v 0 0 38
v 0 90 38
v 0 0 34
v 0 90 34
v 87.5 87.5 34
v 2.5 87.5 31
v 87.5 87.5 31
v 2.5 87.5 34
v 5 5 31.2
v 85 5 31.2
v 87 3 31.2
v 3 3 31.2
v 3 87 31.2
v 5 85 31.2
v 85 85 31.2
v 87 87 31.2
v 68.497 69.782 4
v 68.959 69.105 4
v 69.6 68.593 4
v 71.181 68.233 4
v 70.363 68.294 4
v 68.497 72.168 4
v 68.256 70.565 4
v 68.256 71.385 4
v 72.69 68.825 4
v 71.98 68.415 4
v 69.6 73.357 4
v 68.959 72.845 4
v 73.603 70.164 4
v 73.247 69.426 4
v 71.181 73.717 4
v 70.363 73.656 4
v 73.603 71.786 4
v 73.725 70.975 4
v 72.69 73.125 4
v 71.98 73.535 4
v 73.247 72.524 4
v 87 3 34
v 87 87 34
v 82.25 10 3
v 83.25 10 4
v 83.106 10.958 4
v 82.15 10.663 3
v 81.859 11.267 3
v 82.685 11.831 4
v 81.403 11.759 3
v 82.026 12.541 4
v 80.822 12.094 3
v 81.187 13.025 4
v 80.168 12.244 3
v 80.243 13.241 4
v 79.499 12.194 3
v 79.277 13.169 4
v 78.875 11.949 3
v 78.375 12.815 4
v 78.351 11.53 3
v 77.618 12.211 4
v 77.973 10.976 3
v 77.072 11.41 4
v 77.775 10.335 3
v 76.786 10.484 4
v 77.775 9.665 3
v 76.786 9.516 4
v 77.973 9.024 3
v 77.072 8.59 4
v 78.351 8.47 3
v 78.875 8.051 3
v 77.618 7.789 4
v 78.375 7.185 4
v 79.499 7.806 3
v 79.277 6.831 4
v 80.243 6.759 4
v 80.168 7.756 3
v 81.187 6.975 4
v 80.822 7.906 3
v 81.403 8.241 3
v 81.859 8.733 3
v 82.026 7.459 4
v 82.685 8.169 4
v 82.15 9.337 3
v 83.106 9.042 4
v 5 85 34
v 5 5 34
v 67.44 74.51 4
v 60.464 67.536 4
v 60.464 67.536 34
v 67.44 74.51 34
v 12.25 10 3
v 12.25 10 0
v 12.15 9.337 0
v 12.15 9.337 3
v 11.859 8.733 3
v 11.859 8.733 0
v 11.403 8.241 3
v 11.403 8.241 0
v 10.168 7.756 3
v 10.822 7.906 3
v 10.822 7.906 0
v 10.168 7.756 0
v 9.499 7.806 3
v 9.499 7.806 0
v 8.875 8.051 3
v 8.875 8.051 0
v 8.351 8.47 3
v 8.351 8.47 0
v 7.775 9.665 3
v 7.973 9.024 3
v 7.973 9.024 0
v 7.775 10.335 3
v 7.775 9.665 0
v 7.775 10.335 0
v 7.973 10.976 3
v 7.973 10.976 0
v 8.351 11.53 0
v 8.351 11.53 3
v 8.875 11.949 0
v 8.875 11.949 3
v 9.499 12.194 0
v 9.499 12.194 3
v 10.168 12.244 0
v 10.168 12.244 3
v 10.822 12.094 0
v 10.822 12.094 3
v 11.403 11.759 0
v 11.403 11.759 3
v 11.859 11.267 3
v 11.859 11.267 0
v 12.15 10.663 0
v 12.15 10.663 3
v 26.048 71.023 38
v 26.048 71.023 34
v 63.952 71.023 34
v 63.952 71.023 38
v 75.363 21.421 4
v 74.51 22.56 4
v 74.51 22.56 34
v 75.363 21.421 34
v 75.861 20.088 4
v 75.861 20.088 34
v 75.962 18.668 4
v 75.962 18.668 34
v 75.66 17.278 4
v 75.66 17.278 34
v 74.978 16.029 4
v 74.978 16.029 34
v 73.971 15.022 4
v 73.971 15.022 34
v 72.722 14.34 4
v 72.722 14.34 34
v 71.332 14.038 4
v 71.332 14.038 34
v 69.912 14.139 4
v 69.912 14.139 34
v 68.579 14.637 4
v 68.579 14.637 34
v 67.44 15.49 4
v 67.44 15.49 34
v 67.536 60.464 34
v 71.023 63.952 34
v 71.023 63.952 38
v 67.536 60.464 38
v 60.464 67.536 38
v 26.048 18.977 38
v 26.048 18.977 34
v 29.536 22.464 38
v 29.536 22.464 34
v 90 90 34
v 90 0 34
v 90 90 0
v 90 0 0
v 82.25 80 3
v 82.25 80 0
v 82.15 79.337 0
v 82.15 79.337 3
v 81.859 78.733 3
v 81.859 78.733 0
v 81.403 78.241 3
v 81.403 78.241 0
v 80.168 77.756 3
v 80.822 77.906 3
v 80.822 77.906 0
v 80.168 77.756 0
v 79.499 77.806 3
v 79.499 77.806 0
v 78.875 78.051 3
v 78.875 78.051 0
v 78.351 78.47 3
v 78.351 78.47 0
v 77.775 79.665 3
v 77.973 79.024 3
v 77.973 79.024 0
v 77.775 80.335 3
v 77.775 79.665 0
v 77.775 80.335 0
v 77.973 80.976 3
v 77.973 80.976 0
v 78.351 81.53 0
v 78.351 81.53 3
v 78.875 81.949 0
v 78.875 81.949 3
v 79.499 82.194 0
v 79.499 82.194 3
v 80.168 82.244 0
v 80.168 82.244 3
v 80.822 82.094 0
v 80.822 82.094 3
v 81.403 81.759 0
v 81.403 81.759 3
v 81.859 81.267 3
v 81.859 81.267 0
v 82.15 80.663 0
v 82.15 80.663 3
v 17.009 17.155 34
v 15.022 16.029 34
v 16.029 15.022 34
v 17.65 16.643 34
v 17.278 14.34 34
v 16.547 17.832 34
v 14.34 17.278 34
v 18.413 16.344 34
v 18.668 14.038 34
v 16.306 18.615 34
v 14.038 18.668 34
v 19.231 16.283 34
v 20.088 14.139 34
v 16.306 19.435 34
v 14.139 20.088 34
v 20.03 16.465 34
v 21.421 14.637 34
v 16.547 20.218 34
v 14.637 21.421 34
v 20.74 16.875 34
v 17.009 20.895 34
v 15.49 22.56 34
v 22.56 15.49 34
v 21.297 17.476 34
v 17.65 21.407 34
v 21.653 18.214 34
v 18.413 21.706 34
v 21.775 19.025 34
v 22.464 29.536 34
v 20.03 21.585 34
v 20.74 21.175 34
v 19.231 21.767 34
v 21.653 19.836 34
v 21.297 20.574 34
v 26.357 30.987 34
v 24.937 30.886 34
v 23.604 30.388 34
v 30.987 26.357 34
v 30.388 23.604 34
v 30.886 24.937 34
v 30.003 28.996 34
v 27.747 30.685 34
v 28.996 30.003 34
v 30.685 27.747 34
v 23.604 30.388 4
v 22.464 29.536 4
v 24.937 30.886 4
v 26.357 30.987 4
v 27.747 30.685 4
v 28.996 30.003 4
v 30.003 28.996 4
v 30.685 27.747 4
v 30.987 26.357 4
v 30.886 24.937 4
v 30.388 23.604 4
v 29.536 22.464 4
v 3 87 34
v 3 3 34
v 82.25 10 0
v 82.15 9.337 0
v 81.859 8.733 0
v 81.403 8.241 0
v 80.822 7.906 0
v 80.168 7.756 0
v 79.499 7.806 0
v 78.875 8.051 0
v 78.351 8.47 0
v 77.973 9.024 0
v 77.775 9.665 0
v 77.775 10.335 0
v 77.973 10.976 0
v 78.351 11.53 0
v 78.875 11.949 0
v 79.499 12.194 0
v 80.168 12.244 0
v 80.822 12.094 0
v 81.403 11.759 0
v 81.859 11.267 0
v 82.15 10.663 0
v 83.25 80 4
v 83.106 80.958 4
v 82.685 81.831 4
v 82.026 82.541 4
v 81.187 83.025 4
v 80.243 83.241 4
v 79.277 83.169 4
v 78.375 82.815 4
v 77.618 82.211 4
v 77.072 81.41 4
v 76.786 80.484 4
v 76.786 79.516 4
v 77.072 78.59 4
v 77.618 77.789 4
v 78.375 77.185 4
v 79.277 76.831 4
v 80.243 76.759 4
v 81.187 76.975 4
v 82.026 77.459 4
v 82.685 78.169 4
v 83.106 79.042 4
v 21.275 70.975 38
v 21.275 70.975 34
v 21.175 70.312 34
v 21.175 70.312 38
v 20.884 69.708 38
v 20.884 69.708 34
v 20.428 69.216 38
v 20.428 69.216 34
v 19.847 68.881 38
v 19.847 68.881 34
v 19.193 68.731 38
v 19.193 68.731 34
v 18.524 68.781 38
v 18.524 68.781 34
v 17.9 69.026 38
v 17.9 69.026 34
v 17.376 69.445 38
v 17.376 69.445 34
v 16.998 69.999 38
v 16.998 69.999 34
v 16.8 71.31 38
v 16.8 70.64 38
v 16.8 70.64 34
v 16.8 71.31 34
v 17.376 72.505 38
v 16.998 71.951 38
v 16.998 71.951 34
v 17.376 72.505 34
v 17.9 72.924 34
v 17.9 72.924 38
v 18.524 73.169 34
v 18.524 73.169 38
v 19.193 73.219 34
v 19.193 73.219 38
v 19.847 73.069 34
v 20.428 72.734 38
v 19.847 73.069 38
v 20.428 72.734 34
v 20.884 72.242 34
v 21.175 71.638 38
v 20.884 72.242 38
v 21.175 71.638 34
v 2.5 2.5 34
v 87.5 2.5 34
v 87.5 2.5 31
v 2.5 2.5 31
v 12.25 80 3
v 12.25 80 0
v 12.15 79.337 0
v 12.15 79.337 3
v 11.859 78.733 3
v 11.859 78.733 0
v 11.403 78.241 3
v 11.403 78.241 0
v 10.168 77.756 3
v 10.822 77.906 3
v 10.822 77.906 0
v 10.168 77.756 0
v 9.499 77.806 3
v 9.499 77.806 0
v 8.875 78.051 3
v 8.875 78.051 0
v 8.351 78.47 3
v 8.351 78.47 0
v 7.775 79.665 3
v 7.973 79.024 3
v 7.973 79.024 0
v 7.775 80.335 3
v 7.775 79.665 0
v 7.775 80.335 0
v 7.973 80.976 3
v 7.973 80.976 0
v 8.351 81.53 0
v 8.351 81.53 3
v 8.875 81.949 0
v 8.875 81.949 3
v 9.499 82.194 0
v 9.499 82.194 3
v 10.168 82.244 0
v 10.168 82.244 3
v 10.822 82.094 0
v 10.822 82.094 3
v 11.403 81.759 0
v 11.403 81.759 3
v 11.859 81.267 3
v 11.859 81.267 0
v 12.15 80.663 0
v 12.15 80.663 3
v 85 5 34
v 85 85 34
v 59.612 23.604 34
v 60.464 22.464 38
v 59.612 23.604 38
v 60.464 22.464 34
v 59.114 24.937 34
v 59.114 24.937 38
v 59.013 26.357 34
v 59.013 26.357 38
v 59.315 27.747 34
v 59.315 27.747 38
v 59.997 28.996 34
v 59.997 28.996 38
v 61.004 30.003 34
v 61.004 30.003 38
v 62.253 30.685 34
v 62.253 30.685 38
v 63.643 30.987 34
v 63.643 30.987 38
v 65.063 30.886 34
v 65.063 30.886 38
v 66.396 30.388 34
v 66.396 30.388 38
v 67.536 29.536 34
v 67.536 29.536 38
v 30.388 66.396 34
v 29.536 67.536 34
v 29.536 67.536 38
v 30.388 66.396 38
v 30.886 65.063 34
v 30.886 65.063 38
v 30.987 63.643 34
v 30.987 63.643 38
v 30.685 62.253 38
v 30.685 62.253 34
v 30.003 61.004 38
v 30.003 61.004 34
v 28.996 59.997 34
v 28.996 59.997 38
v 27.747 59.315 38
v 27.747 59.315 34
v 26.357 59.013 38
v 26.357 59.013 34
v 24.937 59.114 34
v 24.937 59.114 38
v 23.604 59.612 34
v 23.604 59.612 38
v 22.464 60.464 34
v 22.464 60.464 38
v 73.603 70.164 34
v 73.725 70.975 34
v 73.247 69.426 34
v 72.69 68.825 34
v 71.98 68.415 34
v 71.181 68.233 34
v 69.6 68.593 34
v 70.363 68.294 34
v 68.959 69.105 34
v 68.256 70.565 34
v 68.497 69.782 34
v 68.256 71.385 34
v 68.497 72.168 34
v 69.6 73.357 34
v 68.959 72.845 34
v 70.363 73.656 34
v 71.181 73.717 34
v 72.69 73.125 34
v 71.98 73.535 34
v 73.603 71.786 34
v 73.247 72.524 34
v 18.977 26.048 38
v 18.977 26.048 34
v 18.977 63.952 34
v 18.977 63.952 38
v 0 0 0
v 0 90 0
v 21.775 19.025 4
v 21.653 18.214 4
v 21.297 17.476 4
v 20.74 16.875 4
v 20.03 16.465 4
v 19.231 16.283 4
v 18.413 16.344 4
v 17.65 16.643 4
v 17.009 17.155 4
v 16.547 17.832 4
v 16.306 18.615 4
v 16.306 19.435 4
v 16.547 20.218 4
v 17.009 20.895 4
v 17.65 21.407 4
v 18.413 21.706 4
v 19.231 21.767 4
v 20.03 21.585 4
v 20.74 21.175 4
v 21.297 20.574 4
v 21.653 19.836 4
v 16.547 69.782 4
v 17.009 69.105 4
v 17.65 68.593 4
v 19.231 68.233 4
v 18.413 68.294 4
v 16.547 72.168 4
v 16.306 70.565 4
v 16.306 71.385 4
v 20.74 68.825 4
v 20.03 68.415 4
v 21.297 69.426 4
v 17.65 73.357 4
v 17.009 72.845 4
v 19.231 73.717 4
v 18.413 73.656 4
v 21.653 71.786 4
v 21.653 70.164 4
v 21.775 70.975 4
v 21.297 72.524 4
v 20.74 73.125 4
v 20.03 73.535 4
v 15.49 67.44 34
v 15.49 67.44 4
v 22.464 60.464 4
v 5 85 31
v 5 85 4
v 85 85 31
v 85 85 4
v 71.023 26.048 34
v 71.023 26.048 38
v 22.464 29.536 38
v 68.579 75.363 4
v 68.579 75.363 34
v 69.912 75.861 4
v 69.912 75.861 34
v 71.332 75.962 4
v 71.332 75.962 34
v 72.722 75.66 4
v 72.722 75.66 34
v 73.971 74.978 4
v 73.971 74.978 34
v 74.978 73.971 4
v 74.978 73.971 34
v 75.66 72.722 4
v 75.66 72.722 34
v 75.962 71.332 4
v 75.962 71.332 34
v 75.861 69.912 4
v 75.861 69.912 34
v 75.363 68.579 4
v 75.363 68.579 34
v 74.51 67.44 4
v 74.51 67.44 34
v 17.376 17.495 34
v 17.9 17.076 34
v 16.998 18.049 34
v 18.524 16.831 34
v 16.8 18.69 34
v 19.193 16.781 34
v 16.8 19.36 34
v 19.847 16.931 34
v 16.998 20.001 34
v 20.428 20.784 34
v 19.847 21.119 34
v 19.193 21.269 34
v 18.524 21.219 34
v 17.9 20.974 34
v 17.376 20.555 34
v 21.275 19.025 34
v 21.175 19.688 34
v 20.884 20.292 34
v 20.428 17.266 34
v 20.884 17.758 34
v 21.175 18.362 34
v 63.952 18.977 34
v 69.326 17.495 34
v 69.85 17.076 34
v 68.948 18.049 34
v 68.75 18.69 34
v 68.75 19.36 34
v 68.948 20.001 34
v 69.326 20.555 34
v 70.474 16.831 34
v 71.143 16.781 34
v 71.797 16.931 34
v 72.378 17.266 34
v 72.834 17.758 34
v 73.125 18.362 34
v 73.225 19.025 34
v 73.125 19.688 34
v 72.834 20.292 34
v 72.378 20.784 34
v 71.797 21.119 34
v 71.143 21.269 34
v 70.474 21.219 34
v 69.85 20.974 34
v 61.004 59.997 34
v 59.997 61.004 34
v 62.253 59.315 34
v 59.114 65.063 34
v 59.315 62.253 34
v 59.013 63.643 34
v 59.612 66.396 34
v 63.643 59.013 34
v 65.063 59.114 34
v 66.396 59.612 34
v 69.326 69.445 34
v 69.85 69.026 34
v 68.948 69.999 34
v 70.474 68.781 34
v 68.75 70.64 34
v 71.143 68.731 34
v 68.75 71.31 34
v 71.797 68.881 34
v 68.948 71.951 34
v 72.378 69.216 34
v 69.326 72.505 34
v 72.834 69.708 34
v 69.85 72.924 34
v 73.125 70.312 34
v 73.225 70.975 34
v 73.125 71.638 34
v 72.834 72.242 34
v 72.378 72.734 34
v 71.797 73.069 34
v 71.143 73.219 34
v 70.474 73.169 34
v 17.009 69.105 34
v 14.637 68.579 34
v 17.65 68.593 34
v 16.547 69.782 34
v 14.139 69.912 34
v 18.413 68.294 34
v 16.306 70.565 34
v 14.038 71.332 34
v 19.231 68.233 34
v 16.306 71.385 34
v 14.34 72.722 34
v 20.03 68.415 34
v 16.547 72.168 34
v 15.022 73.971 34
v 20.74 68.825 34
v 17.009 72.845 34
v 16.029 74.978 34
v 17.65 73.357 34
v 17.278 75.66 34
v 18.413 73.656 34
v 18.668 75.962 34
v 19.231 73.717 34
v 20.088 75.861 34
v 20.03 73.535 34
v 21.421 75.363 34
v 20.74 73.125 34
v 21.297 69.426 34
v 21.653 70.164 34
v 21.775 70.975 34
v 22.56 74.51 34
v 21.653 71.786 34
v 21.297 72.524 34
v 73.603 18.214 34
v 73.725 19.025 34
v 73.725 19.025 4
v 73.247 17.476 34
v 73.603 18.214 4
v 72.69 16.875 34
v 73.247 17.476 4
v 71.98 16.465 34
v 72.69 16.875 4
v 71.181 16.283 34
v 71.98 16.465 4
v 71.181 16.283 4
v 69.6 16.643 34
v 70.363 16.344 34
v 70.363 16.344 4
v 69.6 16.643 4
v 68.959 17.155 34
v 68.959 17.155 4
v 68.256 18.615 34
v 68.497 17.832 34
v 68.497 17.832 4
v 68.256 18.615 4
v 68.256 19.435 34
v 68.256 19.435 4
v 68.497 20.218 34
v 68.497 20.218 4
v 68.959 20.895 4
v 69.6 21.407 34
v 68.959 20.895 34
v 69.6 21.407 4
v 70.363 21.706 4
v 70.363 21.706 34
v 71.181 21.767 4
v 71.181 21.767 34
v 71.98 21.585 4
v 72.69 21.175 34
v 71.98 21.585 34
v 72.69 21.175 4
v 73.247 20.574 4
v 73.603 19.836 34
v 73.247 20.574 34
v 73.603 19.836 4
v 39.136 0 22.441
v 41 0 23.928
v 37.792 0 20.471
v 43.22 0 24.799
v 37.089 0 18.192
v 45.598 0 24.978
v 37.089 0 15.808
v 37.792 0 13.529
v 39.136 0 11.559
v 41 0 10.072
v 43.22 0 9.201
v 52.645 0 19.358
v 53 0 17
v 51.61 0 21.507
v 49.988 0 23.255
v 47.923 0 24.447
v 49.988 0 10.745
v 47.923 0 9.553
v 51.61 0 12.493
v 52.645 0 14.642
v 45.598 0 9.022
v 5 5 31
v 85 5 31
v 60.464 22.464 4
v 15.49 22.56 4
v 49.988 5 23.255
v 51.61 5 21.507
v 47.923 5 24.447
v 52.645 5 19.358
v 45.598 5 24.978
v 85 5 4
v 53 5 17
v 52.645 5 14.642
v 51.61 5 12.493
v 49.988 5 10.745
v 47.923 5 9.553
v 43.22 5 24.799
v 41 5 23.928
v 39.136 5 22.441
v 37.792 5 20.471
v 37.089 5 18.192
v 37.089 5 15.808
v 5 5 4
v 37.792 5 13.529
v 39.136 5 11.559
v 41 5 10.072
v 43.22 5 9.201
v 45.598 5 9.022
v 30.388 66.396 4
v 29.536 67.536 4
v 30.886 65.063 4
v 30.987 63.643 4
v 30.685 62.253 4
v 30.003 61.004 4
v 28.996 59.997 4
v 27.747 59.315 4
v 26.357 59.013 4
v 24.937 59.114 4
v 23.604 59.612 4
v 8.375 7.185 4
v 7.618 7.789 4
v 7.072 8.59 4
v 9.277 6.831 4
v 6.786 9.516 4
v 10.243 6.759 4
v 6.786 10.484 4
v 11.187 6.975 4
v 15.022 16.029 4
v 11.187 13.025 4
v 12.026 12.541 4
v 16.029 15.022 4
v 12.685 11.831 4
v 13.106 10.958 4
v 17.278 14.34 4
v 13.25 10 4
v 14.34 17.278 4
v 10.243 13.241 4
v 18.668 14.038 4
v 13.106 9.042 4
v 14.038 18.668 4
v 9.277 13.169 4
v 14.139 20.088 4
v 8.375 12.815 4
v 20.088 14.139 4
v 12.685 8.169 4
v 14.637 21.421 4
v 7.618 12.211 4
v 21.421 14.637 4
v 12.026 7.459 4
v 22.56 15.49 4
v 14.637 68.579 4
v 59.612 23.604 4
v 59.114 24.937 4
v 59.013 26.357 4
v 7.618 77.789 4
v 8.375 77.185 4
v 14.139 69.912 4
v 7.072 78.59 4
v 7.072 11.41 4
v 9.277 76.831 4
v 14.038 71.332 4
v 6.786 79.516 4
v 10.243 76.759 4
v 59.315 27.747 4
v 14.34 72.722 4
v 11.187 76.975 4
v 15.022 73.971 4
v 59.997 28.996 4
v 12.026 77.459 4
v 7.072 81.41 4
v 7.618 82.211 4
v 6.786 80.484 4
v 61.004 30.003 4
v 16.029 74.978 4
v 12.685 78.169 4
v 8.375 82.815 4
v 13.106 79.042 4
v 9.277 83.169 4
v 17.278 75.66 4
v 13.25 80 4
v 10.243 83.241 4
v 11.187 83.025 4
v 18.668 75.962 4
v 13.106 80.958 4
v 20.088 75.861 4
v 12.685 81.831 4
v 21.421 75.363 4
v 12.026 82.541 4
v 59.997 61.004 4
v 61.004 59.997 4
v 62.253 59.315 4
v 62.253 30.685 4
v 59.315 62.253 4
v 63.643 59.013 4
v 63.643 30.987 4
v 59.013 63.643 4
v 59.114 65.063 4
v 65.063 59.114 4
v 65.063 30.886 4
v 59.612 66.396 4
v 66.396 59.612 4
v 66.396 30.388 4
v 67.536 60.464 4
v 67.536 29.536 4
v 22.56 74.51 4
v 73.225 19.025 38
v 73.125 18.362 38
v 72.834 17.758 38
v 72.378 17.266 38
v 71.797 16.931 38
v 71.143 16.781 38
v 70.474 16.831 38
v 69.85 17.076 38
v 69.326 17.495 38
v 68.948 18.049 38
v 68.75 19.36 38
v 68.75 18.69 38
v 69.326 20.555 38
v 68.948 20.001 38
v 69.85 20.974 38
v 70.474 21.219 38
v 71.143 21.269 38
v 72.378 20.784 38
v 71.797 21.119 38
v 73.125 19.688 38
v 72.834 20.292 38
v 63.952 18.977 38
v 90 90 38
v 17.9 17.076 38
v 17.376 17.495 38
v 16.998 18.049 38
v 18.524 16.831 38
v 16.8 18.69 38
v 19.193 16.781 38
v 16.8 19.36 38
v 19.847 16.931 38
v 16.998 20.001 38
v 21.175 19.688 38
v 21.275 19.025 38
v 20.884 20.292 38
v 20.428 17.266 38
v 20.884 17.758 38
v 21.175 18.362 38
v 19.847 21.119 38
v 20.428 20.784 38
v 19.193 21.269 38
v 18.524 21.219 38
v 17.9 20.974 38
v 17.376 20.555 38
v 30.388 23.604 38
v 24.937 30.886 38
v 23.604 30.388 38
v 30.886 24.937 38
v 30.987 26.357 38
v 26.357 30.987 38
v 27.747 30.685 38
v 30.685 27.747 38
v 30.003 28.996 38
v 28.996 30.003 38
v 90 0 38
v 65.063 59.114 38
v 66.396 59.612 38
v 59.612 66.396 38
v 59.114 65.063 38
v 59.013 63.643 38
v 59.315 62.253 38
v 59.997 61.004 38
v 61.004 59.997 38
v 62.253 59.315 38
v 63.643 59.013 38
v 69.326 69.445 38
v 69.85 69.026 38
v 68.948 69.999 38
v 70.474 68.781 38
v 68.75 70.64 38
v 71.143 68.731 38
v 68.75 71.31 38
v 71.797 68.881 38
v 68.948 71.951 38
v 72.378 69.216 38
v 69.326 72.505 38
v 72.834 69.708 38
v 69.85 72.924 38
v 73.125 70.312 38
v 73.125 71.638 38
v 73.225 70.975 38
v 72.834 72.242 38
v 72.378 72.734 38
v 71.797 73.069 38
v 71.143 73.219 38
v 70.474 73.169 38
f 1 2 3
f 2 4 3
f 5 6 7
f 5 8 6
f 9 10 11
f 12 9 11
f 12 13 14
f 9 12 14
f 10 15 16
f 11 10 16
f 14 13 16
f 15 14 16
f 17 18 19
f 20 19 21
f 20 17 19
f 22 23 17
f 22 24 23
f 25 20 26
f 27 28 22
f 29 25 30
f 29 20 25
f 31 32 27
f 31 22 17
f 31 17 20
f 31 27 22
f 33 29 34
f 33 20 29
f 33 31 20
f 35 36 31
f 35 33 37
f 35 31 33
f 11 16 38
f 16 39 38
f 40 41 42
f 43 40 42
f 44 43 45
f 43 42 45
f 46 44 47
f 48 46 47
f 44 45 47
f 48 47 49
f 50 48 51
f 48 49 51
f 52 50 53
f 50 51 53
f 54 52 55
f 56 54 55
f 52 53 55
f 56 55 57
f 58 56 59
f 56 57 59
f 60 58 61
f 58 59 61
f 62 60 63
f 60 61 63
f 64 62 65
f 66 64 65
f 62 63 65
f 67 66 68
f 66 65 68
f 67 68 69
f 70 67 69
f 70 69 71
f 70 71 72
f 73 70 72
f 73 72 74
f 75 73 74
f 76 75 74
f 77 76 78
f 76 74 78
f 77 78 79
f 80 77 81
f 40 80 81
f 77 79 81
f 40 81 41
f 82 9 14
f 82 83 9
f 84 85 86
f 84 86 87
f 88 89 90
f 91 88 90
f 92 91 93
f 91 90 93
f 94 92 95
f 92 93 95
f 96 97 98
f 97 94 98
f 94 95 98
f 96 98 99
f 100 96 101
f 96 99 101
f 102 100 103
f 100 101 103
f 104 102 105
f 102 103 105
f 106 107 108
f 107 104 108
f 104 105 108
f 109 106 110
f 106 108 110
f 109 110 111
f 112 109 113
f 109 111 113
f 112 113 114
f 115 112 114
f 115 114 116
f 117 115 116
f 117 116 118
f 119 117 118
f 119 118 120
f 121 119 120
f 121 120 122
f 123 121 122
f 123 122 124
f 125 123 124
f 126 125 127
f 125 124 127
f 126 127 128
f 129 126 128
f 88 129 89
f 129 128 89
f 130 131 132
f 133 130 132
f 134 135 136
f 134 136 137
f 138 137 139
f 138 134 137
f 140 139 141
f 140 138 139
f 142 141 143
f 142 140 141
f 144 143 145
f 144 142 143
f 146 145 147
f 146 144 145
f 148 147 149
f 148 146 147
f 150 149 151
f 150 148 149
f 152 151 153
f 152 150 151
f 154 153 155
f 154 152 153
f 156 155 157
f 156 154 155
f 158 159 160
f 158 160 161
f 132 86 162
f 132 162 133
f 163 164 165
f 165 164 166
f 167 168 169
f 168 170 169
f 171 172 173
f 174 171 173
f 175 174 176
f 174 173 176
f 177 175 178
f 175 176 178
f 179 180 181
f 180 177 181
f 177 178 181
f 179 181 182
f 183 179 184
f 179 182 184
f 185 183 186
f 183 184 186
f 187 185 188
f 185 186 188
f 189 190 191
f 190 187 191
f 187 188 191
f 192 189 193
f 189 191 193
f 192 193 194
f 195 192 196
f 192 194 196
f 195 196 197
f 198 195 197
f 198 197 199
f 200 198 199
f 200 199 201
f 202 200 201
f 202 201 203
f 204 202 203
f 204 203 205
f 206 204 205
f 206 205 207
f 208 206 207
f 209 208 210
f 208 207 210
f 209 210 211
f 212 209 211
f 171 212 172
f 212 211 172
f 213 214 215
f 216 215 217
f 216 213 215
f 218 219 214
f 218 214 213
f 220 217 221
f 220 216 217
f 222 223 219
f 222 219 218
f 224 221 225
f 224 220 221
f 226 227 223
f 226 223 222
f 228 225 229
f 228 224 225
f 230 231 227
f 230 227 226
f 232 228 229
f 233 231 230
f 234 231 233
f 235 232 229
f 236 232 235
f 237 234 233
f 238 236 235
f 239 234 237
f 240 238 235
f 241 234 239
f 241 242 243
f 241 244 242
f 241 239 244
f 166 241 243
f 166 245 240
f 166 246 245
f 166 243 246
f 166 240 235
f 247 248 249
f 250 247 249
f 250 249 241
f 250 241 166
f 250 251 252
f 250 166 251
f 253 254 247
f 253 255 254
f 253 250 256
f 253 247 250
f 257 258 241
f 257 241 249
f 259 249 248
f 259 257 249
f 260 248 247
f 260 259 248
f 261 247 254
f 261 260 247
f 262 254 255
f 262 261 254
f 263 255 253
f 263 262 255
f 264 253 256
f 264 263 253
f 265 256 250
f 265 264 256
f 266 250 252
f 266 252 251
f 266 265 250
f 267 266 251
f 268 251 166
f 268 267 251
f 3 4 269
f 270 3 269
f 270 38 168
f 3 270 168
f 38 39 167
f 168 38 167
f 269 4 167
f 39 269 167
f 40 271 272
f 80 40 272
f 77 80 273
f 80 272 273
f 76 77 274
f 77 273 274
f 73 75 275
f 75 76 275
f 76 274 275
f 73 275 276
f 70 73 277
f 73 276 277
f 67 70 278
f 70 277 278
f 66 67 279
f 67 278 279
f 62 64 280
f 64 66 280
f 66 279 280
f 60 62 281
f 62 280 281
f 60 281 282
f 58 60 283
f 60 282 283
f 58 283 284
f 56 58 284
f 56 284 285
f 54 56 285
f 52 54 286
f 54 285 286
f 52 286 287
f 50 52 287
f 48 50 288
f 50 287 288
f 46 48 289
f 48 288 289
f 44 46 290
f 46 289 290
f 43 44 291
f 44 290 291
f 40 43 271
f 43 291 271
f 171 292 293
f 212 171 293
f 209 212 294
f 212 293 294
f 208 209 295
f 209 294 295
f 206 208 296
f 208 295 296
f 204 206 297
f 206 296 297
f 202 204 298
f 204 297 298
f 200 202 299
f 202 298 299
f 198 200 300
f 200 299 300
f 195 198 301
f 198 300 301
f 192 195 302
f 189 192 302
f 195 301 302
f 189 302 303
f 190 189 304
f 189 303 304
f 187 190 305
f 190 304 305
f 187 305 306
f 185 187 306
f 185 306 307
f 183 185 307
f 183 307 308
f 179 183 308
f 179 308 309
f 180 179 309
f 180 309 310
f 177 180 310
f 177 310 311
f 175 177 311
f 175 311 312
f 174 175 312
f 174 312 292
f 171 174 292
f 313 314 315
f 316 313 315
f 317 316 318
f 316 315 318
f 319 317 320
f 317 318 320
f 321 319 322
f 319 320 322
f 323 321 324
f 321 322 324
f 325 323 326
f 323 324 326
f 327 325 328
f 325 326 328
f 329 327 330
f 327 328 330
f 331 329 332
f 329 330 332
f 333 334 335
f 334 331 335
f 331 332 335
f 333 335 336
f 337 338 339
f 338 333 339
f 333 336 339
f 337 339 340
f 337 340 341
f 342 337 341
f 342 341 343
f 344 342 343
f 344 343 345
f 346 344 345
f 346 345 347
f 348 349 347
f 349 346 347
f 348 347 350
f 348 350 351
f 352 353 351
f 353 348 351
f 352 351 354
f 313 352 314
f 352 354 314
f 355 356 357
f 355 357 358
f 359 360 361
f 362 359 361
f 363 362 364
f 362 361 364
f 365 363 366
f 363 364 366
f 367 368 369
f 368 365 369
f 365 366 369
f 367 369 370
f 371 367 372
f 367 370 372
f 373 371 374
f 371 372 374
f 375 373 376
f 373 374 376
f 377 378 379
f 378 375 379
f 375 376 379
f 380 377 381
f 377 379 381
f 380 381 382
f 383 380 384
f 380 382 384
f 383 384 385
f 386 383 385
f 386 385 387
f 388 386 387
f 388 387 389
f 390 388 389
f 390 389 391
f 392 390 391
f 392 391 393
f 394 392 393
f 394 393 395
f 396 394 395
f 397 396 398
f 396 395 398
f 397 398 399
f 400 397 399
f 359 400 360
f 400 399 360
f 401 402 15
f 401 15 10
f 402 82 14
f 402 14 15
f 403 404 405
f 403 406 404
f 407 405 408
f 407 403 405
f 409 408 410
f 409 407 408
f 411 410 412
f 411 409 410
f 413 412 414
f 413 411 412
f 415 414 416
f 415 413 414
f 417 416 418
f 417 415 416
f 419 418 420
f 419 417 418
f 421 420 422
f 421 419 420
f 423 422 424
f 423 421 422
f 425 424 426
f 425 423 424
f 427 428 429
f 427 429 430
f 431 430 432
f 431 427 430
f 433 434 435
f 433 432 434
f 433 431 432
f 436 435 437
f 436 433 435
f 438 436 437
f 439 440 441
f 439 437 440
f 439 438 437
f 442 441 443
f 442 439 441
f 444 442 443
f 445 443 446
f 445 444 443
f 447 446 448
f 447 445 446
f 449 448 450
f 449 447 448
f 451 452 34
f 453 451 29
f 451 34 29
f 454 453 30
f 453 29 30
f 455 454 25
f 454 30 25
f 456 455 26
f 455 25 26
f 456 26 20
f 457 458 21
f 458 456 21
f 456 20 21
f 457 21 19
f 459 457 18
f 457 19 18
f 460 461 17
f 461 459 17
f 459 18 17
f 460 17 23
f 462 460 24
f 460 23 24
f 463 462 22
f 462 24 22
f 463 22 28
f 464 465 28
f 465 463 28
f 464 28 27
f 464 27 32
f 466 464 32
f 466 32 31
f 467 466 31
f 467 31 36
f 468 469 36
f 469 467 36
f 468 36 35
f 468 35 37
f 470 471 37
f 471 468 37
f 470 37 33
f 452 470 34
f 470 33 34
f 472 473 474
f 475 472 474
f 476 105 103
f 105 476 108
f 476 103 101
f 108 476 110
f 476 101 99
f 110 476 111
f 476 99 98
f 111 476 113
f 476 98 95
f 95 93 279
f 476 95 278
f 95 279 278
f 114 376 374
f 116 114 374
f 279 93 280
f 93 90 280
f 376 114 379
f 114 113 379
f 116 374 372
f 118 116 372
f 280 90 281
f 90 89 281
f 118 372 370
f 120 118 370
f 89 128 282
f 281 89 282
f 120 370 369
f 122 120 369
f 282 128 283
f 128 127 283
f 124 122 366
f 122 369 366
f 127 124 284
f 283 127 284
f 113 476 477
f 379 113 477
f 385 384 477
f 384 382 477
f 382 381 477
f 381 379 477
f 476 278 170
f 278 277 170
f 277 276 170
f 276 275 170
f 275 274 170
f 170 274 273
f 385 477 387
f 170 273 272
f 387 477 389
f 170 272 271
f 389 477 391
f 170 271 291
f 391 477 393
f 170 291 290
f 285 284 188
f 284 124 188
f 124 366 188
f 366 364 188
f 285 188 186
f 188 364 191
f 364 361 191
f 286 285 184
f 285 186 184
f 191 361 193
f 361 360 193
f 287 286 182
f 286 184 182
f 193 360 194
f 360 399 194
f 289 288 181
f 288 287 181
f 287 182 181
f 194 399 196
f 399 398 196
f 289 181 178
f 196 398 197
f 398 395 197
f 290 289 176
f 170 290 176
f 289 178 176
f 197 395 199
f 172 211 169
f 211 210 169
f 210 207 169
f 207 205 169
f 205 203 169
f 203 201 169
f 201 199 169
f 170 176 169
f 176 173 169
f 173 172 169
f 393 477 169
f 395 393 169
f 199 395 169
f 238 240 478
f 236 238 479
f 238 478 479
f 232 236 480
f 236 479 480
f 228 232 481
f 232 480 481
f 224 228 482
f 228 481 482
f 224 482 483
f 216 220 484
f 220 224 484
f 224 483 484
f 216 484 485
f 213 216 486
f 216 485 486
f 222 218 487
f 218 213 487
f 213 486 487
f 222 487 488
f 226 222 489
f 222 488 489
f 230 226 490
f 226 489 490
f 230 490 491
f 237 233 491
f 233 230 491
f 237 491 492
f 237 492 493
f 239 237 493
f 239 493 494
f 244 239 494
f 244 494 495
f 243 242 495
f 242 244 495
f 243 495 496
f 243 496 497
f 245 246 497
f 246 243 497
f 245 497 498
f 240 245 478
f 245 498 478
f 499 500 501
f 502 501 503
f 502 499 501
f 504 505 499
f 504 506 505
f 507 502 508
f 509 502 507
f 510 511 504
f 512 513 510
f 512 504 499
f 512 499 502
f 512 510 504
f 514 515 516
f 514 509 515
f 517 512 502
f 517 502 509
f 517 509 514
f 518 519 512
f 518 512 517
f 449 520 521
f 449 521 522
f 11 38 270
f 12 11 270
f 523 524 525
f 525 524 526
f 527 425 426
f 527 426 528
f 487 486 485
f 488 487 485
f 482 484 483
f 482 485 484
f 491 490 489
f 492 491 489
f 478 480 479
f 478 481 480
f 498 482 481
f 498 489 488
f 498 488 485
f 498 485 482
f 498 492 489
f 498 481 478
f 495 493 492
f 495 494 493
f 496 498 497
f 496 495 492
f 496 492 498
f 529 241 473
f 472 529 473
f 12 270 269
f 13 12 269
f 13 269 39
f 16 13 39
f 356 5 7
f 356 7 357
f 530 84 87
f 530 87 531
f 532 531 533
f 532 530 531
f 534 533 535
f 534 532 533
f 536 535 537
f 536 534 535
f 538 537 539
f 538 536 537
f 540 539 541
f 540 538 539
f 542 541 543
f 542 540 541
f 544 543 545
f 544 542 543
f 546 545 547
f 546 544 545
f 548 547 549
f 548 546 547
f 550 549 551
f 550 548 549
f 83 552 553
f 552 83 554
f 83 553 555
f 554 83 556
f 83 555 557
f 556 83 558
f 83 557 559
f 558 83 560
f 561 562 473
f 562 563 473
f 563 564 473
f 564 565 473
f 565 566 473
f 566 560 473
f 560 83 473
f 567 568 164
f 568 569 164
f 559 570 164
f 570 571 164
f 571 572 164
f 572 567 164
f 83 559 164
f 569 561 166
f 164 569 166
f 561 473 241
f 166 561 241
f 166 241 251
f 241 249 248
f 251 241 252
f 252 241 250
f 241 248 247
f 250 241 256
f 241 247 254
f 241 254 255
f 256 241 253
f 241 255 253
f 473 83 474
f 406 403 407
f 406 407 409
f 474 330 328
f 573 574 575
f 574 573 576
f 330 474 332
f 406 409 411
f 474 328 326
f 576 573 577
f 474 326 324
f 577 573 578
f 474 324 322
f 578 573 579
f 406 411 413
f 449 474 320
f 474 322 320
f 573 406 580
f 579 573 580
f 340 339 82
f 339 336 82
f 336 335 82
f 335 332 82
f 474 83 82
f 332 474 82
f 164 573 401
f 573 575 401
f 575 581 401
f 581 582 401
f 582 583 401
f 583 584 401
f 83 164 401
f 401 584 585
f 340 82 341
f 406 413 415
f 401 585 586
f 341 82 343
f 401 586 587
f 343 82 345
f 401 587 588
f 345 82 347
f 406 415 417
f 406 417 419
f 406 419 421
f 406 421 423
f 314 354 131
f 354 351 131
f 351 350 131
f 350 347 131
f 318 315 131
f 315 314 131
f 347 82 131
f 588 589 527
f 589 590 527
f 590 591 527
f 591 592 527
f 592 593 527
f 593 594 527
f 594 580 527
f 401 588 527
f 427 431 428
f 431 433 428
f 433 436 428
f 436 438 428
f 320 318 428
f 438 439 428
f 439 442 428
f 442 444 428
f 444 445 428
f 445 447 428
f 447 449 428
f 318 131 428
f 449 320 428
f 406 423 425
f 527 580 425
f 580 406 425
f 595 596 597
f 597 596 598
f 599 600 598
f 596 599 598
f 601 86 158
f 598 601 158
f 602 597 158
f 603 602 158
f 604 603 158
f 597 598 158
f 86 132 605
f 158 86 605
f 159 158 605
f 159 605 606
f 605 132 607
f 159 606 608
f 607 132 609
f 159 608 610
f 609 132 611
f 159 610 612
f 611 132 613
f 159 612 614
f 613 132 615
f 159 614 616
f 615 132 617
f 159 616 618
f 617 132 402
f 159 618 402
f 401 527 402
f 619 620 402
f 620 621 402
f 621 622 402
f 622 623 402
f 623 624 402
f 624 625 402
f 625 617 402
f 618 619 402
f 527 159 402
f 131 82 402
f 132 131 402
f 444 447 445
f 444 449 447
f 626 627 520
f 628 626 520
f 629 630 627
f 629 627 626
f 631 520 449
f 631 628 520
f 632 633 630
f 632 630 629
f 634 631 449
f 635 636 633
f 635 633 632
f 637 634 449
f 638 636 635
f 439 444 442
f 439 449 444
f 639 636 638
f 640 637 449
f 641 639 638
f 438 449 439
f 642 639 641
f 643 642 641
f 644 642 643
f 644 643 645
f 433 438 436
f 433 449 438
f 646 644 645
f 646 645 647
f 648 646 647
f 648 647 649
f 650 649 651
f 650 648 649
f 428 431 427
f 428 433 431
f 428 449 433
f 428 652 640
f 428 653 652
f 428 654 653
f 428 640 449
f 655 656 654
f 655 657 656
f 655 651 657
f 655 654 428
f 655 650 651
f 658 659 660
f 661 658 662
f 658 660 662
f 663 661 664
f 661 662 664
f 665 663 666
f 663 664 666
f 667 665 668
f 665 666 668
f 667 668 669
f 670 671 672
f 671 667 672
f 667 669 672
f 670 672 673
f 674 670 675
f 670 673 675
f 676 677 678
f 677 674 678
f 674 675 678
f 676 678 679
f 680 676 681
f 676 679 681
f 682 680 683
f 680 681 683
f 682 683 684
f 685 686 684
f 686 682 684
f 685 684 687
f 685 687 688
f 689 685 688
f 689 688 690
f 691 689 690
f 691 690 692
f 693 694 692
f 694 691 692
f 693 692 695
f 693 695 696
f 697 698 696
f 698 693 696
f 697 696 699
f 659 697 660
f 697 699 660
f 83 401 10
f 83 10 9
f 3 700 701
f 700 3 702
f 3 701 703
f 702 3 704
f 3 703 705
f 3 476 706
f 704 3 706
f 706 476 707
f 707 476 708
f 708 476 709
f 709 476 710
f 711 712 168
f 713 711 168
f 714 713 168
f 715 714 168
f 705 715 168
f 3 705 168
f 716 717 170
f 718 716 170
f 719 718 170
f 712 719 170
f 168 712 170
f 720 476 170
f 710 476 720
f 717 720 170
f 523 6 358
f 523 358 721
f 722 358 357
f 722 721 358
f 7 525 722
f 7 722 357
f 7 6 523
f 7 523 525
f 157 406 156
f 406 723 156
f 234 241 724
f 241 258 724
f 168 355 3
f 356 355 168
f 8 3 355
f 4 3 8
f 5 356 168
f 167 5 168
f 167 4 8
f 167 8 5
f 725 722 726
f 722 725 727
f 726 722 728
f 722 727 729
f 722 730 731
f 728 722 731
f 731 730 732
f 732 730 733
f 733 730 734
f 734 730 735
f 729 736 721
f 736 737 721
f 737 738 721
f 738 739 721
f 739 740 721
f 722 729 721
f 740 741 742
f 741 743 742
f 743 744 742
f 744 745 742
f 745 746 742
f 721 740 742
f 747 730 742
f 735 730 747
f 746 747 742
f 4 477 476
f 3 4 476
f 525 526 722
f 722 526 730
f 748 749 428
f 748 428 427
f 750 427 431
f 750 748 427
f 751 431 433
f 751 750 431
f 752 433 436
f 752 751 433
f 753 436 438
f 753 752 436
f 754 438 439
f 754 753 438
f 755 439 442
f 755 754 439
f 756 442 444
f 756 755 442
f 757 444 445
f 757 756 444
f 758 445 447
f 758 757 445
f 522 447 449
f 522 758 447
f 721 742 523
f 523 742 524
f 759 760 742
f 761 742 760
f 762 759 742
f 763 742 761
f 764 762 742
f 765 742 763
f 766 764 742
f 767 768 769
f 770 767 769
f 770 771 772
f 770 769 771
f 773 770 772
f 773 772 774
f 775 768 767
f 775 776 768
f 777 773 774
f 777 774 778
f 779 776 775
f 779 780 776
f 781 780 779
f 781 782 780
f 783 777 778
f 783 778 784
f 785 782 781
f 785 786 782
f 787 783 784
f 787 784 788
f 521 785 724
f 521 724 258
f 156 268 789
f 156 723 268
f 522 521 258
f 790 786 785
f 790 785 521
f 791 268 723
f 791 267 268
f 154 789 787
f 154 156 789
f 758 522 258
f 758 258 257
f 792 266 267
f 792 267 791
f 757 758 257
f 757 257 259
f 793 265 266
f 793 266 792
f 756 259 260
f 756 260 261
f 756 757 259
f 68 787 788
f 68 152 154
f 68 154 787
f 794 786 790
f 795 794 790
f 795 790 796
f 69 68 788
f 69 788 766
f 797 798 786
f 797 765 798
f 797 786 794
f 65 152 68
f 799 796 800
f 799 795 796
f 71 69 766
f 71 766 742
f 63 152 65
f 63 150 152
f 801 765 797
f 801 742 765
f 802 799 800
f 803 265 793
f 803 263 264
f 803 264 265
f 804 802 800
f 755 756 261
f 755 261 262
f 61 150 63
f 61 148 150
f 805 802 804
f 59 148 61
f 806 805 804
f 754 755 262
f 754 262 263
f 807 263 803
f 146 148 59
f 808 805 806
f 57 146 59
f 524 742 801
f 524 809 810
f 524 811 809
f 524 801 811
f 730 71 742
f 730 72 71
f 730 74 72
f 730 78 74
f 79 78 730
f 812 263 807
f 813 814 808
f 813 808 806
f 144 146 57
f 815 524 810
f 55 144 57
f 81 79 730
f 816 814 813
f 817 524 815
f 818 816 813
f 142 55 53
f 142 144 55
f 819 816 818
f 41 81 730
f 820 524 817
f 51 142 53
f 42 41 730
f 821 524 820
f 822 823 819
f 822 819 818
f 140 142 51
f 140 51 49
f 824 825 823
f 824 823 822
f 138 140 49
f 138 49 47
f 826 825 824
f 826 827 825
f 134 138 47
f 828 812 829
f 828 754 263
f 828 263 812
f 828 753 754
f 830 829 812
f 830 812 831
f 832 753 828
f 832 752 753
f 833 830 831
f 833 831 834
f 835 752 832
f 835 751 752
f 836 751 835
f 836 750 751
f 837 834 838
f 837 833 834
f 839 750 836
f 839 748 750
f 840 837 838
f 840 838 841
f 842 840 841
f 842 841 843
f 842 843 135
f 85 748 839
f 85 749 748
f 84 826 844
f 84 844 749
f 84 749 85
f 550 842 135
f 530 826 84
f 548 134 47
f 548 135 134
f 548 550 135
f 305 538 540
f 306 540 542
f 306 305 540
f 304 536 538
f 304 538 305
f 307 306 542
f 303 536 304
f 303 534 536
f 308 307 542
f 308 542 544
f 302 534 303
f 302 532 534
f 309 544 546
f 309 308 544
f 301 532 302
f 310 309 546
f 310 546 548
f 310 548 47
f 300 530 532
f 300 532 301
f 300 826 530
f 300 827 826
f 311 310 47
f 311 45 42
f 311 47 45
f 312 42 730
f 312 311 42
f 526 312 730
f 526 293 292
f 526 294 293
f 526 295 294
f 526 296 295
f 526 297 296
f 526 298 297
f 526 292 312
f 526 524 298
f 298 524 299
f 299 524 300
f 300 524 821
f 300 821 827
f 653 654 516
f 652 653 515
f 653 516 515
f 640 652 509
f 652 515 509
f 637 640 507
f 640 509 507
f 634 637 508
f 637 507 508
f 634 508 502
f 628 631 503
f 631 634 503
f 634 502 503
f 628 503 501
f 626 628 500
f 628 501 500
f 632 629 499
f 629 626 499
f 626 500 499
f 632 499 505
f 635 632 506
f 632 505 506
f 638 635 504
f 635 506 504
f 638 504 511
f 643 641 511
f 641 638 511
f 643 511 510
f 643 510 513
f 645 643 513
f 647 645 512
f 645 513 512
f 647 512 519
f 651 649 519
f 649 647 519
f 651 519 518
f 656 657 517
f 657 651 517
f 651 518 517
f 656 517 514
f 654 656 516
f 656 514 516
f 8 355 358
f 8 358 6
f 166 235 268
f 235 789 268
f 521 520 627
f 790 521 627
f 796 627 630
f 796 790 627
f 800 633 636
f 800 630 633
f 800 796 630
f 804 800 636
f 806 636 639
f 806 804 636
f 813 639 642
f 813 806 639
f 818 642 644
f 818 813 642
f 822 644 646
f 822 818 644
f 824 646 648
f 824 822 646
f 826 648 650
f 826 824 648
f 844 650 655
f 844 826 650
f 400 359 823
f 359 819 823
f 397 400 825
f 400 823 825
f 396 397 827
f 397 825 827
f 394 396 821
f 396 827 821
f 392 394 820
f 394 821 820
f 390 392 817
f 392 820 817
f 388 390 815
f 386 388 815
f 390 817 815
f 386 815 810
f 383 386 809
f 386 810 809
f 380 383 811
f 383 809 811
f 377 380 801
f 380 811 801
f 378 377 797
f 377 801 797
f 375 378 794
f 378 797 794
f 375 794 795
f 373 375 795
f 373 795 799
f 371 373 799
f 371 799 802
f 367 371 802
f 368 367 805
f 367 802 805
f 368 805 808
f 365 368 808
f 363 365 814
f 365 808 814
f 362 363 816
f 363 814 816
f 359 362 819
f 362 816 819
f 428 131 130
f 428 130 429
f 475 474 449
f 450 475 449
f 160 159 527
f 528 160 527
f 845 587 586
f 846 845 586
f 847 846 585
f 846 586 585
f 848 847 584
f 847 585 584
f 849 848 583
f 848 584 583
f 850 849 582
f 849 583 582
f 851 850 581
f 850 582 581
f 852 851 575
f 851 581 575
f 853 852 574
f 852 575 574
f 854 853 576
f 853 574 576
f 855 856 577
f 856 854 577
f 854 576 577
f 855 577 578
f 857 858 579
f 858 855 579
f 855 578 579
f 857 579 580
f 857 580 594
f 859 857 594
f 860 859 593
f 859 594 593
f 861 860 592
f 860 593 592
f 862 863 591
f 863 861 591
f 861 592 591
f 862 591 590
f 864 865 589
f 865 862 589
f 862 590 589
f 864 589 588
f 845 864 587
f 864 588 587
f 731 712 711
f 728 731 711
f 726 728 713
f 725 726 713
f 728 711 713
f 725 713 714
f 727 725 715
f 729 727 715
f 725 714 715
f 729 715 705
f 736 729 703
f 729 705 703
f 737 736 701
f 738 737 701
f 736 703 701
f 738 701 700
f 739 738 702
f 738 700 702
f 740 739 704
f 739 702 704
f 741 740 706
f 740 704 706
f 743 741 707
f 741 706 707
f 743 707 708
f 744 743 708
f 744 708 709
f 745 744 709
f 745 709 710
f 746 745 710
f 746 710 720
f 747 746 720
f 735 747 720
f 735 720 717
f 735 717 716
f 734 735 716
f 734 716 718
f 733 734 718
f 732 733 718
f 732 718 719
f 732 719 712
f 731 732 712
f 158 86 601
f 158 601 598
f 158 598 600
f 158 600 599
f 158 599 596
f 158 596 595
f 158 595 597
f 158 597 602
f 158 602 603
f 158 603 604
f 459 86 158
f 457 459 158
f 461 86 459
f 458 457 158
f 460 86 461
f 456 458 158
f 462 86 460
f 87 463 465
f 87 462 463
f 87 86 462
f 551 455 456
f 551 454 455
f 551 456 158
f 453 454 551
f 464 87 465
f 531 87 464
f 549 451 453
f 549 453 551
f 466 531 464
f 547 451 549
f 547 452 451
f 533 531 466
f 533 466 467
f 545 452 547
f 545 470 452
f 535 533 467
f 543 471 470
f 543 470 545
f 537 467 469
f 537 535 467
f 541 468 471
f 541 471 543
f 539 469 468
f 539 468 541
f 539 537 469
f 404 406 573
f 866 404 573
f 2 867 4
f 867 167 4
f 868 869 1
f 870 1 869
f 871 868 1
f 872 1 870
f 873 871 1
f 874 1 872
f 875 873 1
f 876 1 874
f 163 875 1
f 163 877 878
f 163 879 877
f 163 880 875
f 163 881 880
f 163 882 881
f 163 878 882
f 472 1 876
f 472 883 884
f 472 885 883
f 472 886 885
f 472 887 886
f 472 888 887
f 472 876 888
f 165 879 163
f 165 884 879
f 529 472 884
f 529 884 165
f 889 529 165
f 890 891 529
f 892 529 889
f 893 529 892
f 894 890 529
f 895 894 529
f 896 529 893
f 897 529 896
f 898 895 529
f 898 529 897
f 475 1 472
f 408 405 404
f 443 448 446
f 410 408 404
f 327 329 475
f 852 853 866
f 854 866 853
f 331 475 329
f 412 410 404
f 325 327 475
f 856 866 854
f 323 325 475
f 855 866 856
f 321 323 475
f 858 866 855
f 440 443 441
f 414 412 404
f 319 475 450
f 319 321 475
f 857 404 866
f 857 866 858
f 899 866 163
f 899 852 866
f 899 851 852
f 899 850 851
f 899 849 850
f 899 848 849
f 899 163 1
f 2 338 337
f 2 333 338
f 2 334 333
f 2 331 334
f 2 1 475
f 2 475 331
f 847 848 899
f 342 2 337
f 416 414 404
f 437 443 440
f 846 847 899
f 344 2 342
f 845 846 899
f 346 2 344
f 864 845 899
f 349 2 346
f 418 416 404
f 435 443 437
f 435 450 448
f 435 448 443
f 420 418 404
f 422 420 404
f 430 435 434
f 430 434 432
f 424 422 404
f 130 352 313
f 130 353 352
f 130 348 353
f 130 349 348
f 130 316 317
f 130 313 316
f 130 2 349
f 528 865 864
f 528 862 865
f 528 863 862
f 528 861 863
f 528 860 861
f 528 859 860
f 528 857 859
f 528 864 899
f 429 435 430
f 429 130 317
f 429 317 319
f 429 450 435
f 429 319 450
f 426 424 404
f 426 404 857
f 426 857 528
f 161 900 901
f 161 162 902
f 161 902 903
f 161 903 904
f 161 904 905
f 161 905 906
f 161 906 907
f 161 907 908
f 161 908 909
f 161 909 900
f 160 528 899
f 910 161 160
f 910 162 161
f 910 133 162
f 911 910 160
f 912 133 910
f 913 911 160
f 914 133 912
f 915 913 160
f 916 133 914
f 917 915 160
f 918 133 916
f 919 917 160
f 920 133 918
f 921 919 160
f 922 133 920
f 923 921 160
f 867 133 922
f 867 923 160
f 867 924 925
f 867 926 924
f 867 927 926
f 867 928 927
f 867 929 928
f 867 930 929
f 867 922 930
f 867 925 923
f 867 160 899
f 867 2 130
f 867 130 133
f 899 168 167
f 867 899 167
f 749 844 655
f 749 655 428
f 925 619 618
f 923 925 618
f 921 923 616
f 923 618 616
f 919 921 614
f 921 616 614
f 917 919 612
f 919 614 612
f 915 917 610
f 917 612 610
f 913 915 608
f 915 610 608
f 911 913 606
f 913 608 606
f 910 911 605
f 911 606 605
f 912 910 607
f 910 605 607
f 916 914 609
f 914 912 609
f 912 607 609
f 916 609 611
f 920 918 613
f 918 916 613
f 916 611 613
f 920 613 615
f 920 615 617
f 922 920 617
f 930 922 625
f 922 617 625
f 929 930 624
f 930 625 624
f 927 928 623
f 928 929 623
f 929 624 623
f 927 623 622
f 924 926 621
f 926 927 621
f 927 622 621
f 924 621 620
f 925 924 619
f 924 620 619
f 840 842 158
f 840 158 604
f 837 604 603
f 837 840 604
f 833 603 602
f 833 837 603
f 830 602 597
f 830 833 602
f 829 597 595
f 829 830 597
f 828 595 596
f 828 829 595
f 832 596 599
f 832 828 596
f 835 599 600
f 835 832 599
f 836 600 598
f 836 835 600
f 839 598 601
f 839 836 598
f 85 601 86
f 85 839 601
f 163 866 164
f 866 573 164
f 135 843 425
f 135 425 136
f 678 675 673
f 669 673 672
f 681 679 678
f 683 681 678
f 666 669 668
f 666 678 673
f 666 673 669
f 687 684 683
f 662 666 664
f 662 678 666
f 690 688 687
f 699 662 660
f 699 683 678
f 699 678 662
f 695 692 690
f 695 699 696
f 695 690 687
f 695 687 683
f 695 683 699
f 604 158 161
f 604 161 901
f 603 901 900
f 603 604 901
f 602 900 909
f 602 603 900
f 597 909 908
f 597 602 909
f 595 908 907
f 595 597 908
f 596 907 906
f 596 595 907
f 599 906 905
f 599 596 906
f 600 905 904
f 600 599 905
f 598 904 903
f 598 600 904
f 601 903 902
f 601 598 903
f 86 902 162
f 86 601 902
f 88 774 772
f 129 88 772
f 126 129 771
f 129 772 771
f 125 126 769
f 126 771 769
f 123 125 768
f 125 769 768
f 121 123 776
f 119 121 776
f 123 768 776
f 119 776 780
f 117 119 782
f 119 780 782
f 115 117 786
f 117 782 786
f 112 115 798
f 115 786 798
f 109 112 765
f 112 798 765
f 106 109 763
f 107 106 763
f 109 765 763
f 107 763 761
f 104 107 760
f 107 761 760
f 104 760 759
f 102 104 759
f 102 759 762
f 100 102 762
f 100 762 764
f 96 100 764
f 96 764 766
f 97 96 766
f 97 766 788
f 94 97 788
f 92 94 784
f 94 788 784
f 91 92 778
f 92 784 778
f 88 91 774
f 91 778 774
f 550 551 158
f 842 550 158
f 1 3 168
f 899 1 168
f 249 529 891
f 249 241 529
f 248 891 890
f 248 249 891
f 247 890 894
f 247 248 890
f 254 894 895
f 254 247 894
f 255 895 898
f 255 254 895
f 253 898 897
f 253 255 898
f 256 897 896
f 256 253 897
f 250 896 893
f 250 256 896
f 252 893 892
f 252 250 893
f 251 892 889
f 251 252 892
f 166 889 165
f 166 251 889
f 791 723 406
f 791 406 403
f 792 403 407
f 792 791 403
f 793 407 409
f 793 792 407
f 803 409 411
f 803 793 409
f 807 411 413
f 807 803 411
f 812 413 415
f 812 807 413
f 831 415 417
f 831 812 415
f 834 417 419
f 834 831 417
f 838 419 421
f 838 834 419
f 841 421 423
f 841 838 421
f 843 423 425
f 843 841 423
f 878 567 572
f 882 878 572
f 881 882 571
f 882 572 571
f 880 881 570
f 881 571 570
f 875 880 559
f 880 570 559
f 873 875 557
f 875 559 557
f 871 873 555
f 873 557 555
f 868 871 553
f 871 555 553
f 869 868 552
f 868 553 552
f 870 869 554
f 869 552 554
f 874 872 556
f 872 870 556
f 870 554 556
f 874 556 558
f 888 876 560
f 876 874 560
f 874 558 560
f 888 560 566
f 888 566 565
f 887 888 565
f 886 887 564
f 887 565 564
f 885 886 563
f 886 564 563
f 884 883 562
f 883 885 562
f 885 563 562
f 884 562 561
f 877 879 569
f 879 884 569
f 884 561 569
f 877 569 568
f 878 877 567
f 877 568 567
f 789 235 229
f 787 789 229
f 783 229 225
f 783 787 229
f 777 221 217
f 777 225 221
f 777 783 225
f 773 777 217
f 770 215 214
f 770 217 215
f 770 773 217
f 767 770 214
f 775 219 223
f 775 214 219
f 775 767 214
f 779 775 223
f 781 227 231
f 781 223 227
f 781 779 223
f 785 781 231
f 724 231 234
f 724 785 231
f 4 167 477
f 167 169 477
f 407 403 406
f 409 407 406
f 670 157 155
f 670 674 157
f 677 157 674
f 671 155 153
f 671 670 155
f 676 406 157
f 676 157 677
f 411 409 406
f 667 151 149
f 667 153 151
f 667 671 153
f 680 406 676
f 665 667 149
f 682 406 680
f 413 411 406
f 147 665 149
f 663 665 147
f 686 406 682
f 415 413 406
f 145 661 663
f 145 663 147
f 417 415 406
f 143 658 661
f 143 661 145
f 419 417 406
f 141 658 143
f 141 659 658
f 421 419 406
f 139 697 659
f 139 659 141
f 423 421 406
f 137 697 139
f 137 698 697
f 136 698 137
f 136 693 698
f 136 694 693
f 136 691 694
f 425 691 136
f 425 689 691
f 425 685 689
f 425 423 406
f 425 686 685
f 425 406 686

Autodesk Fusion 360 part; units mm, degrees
sketch "Sketch1" plane through (0, 0, 0) normal (0, 0, 1) x (1, 0, 0)
  line L0 (0, 0) -> (90, 0)
  line L1 (90, 0) -> (90, 90)
  line L2 (90, 90) -> (0, 90)
  line L3 (0, 90) -> (0, 0)
  line L4 (10, 10) -> (80, 10) construction
  line L5 (80, 10) -> (80, 80) construction
  line L6 (80, 80) -> (10, 80) construction
  line L7 (10, 80) -> (10, 10) construction
  line L8 (45, 80) -> (45, 90) construction
  line L9 (80, 45) -> (90, 45) construction
  line L10 (19.025, 70.975) -> (70.975, 70.975) construction
  line L11 (70.975, 70.975) -> (70.975, 19.025) construction
  line L12 (70.975, 19.025) -> (19.025, 19.025) construction
  line L13 (19.025, 19.025) -> (19.025, 70.975) construction
  line L14 (45, 70.975) -> (45, 80) construction
  line L15 (70.975, 45) -> (80, 45) construction
  circle A0 centre (70.975, 70.975) radius 2.75
  circle A1 centre (70.975, 19.025) radius 2.75
  circle A2 centre (19.025, 19.025) radius 2.75
  circle A3 centre (19.025, 70.975) radius 2.75
  line L16 (26, 64) -> (64, 64) construction
  line L17 (64, 64) -> (64, 26) construction
  line L18 (64, 26) -> (26, 26) construction
  line L19 (26, 26) -> (26, 64) construction
  line L20 (45, 64) -> (45, 70.975) construction
  line L21 (64, 45) -> (70.975, 45) construction
  circle A4 centre (64, 64) radius 5
  circle A5 centre (64, 26) radius 5
  circle A6 centre (26, 26) radius 5
  circle A7 centre (26, 64) radius 5
  circle A8 centre (19.025, 70.975) radius 5
  circle A9 centre (70.975, 70.975) radius 5
  circle A10 centre (70.975, 19.025) radius 5
  circle A11 centre (19.025, 19.025) radius 5
  line L22 (60.4645, 67.5355) -> (67.4395, 74.5105)
  line L23 (74.5105, 67.4395) -> (67.5355, 60.4645)
  line L24 (67.5355, 29.5355) -> (74.5105, 22.5605)
  line L25 (60.4645, 22.4645) -> (67.4395, 15.4895)
  line L26 (22.5605, 15.4895) -> (29.5355, 22.4645)
  line L27 (22.4645, 29.5355) -> (15.4895, 22.5605)
  line L28 (22.5605, 74.5105) -> (29.5355, 67.5355)
  line L29 (15.4895, 67.4395) -> (22.4645, 60.4645)
  line L30 (5, 85) -> (85, 85)
  line L31 (85, 85) -> (85, 5)
  line L32 (85, 5) -> (5, 5)
  line L33 (5, 5) -> (5, 85)
  line L34 (45, 85) -> (45, 90) construction
  line L35 (85, 45) -> (90, 45) construction
  line L36 (18.977, 26.048) -> (18.977, 63.952)
  line L37 (26.048, 71.023) -> (63.952, 71.023)
  line L38 (71.023, 63.952) -> (71.023, 26.048)
  line L39 (63.952, 18.977) -> (26.048, 18.977)
  line L40 (3, 87) -> (87, 87)
  line L41 (87, 87) -> (87, 3)
  line L42 (87, 3) -> (3, 3)
  line L43 (3, 3) -> (3, 87)
  line L44 (2.5, 87.5) -> (87.5, 87.5)
  line L45 (87.5, 87.5) -> (87.5, 2.5)
  line L46 (87.5, 2.5) -> (2.5, 2.5)
  line L47 (2.5, 2.5) -> (2.5, 87.5)
  circle A12 centre (10, 80) radius 2.25
  circle A13 centre (80, 80) radius 2.25
  circle A14 centre (10, 10) radius 2.25
  circle A15 centre (80, 10) radius 2.25
  circle A16 centre (19.025, 70.975) radius 2.25
  circle A17 centre (70.975, 70.975) radius 2.25
  circle A18 centre (70.975, 19.025) radius 2.25
  circle A19 centre (19.025, 19.025) radius 2.25
  point P0 (45, 87)
  point P1 (45, 87.5)
  point P2 (87.5, 45)
  point P3 (87, 45)
  dimension "d1" = 70
  dimension "d2" = 90
  dimension "d3" = 51.95
  dimension "d4" = 5.5
  dimension "d5" = 10
  dimension "d6" = 38
  dimension "d7" = 10
  dimension "d8" = 5
  dimension "d19" = 2
  dimension "d20" = 0.5
  dimension "d29" = 4.5
  dimension "d31" = 4.5
extrude "Extrude1" add sketch "Sketch1" along normal blind 4 contours L0 L1 L2 L3 | A0 | A1 | A2 | A3 | A4 A9 | A4 A9 L22 | A4 A5 A6 A7 L22 L23 L24 L25 L26 L27 L28 L29 L36 L37 L38 L39 | A4 A9 L23 | A4 A9 | A4 A9 | A7 A8 L28 | A5 A10 L24 | A7 A8 | A7 A8 | A5 A10 | A5 A10 | A7 A8 L29 | A7 A8 | A5 A10 L25 | A5 A10 | A6 A11 L27 | A6 A11 L26 | A6 A11 | A6 A11 | A6 A11 | L30 L31 L32 L33 | L40 L41 L42 L43 | L44 L45 L46 L47 | A16 | A17 | A18 | A19 makes body 1
extrude "Extrude2" add sketch "Sketch1" along normal blind 34 contours L0 L1 L2 L3 | A4 A9 | A4 A9 L22 | A4 A9 L23 | A4 A9 | A4 A9 | A7 A8 L28 | A5 A10 L24 | A7 A8 | A7 A8 | A5 A10 | A5 A10 | A7 A8 L29 | A7 A8 | A5 A10 L25 | A5 A10 | A6 A11 L27 | A6 A11 L26 | A6 A11 | A6 A11 | A6 A11 | L40 L41 L42 L43 | L44 L45 L46 L47 bodies 1
extrude "Extrude3" add sketch "Sketch1" along normal blind 4 from surface at 34 separate body contours L0 L1 L2 L3 | A0 | A1 | A2 | A3 | A4 A9 | A4 A9 L22 | A4 A9 L23 | A4 A9 | A4 A9 | A7 A8 L28 | A5 A10 L24 | A7 A8 | A7 A8 | A5 A10 | A5 A10 | A7 A8 L29 | A7 A8 | A5 A10 L25 | A5 A10 | A6 A11 L27 | A6 A11 L26 | A6 A11 | A6 A11 | A6 A11 | L30 L31 L32 L33 | L40 L41 L42 L43 | L44 L45 L46 L47 | A12 | A13 | A14 | A15 makes body 2
sketch "Sketch2" plane through (0, 0, 0) normal (0, -1, 0) x (1, 0, 0)
  line L0 (0, 0) -> (90, 0)
  line L1 (90, 0) -> (90, 34)
  line L2 (90, 34) -> (0, 34)
  line L3 (0, 34) -> (0, 0)
  line L4 (45, 34) -> (45, 0) construction
  line L5 (0, 17) -> (90, 17) construction
  circle A0 centre (45, 17) radius 8
  dimension "d16" = 16
extrude "Extrude4" cut sketch "Sketch2" against normal blind 9 contours A0 bodies 1
extrude "Extrude5" cut sketch "Sketch1" against normal blind 3 from surface at 34 contours L40 L41 L42 L43 | L44 L45 L46 L47 bodies 1
extrude "Extrude6" add sketch "Sketch1" against normal blind 2.8 from surface at 34 contours L40 L41 L42 L43 bodies 2
chamfer "Chamfer1" distance 1 angle 45 4 edges at (7.9023, 80.8136, 4) (77.9023, 80.8136, 4) (77.9023, 10.8136, 4) (7.9023, 10.8136, 4) on bodies 1
equation "d3 = ( ( 57.7 + 46.2 ) / 2 ) * 1 mm"
